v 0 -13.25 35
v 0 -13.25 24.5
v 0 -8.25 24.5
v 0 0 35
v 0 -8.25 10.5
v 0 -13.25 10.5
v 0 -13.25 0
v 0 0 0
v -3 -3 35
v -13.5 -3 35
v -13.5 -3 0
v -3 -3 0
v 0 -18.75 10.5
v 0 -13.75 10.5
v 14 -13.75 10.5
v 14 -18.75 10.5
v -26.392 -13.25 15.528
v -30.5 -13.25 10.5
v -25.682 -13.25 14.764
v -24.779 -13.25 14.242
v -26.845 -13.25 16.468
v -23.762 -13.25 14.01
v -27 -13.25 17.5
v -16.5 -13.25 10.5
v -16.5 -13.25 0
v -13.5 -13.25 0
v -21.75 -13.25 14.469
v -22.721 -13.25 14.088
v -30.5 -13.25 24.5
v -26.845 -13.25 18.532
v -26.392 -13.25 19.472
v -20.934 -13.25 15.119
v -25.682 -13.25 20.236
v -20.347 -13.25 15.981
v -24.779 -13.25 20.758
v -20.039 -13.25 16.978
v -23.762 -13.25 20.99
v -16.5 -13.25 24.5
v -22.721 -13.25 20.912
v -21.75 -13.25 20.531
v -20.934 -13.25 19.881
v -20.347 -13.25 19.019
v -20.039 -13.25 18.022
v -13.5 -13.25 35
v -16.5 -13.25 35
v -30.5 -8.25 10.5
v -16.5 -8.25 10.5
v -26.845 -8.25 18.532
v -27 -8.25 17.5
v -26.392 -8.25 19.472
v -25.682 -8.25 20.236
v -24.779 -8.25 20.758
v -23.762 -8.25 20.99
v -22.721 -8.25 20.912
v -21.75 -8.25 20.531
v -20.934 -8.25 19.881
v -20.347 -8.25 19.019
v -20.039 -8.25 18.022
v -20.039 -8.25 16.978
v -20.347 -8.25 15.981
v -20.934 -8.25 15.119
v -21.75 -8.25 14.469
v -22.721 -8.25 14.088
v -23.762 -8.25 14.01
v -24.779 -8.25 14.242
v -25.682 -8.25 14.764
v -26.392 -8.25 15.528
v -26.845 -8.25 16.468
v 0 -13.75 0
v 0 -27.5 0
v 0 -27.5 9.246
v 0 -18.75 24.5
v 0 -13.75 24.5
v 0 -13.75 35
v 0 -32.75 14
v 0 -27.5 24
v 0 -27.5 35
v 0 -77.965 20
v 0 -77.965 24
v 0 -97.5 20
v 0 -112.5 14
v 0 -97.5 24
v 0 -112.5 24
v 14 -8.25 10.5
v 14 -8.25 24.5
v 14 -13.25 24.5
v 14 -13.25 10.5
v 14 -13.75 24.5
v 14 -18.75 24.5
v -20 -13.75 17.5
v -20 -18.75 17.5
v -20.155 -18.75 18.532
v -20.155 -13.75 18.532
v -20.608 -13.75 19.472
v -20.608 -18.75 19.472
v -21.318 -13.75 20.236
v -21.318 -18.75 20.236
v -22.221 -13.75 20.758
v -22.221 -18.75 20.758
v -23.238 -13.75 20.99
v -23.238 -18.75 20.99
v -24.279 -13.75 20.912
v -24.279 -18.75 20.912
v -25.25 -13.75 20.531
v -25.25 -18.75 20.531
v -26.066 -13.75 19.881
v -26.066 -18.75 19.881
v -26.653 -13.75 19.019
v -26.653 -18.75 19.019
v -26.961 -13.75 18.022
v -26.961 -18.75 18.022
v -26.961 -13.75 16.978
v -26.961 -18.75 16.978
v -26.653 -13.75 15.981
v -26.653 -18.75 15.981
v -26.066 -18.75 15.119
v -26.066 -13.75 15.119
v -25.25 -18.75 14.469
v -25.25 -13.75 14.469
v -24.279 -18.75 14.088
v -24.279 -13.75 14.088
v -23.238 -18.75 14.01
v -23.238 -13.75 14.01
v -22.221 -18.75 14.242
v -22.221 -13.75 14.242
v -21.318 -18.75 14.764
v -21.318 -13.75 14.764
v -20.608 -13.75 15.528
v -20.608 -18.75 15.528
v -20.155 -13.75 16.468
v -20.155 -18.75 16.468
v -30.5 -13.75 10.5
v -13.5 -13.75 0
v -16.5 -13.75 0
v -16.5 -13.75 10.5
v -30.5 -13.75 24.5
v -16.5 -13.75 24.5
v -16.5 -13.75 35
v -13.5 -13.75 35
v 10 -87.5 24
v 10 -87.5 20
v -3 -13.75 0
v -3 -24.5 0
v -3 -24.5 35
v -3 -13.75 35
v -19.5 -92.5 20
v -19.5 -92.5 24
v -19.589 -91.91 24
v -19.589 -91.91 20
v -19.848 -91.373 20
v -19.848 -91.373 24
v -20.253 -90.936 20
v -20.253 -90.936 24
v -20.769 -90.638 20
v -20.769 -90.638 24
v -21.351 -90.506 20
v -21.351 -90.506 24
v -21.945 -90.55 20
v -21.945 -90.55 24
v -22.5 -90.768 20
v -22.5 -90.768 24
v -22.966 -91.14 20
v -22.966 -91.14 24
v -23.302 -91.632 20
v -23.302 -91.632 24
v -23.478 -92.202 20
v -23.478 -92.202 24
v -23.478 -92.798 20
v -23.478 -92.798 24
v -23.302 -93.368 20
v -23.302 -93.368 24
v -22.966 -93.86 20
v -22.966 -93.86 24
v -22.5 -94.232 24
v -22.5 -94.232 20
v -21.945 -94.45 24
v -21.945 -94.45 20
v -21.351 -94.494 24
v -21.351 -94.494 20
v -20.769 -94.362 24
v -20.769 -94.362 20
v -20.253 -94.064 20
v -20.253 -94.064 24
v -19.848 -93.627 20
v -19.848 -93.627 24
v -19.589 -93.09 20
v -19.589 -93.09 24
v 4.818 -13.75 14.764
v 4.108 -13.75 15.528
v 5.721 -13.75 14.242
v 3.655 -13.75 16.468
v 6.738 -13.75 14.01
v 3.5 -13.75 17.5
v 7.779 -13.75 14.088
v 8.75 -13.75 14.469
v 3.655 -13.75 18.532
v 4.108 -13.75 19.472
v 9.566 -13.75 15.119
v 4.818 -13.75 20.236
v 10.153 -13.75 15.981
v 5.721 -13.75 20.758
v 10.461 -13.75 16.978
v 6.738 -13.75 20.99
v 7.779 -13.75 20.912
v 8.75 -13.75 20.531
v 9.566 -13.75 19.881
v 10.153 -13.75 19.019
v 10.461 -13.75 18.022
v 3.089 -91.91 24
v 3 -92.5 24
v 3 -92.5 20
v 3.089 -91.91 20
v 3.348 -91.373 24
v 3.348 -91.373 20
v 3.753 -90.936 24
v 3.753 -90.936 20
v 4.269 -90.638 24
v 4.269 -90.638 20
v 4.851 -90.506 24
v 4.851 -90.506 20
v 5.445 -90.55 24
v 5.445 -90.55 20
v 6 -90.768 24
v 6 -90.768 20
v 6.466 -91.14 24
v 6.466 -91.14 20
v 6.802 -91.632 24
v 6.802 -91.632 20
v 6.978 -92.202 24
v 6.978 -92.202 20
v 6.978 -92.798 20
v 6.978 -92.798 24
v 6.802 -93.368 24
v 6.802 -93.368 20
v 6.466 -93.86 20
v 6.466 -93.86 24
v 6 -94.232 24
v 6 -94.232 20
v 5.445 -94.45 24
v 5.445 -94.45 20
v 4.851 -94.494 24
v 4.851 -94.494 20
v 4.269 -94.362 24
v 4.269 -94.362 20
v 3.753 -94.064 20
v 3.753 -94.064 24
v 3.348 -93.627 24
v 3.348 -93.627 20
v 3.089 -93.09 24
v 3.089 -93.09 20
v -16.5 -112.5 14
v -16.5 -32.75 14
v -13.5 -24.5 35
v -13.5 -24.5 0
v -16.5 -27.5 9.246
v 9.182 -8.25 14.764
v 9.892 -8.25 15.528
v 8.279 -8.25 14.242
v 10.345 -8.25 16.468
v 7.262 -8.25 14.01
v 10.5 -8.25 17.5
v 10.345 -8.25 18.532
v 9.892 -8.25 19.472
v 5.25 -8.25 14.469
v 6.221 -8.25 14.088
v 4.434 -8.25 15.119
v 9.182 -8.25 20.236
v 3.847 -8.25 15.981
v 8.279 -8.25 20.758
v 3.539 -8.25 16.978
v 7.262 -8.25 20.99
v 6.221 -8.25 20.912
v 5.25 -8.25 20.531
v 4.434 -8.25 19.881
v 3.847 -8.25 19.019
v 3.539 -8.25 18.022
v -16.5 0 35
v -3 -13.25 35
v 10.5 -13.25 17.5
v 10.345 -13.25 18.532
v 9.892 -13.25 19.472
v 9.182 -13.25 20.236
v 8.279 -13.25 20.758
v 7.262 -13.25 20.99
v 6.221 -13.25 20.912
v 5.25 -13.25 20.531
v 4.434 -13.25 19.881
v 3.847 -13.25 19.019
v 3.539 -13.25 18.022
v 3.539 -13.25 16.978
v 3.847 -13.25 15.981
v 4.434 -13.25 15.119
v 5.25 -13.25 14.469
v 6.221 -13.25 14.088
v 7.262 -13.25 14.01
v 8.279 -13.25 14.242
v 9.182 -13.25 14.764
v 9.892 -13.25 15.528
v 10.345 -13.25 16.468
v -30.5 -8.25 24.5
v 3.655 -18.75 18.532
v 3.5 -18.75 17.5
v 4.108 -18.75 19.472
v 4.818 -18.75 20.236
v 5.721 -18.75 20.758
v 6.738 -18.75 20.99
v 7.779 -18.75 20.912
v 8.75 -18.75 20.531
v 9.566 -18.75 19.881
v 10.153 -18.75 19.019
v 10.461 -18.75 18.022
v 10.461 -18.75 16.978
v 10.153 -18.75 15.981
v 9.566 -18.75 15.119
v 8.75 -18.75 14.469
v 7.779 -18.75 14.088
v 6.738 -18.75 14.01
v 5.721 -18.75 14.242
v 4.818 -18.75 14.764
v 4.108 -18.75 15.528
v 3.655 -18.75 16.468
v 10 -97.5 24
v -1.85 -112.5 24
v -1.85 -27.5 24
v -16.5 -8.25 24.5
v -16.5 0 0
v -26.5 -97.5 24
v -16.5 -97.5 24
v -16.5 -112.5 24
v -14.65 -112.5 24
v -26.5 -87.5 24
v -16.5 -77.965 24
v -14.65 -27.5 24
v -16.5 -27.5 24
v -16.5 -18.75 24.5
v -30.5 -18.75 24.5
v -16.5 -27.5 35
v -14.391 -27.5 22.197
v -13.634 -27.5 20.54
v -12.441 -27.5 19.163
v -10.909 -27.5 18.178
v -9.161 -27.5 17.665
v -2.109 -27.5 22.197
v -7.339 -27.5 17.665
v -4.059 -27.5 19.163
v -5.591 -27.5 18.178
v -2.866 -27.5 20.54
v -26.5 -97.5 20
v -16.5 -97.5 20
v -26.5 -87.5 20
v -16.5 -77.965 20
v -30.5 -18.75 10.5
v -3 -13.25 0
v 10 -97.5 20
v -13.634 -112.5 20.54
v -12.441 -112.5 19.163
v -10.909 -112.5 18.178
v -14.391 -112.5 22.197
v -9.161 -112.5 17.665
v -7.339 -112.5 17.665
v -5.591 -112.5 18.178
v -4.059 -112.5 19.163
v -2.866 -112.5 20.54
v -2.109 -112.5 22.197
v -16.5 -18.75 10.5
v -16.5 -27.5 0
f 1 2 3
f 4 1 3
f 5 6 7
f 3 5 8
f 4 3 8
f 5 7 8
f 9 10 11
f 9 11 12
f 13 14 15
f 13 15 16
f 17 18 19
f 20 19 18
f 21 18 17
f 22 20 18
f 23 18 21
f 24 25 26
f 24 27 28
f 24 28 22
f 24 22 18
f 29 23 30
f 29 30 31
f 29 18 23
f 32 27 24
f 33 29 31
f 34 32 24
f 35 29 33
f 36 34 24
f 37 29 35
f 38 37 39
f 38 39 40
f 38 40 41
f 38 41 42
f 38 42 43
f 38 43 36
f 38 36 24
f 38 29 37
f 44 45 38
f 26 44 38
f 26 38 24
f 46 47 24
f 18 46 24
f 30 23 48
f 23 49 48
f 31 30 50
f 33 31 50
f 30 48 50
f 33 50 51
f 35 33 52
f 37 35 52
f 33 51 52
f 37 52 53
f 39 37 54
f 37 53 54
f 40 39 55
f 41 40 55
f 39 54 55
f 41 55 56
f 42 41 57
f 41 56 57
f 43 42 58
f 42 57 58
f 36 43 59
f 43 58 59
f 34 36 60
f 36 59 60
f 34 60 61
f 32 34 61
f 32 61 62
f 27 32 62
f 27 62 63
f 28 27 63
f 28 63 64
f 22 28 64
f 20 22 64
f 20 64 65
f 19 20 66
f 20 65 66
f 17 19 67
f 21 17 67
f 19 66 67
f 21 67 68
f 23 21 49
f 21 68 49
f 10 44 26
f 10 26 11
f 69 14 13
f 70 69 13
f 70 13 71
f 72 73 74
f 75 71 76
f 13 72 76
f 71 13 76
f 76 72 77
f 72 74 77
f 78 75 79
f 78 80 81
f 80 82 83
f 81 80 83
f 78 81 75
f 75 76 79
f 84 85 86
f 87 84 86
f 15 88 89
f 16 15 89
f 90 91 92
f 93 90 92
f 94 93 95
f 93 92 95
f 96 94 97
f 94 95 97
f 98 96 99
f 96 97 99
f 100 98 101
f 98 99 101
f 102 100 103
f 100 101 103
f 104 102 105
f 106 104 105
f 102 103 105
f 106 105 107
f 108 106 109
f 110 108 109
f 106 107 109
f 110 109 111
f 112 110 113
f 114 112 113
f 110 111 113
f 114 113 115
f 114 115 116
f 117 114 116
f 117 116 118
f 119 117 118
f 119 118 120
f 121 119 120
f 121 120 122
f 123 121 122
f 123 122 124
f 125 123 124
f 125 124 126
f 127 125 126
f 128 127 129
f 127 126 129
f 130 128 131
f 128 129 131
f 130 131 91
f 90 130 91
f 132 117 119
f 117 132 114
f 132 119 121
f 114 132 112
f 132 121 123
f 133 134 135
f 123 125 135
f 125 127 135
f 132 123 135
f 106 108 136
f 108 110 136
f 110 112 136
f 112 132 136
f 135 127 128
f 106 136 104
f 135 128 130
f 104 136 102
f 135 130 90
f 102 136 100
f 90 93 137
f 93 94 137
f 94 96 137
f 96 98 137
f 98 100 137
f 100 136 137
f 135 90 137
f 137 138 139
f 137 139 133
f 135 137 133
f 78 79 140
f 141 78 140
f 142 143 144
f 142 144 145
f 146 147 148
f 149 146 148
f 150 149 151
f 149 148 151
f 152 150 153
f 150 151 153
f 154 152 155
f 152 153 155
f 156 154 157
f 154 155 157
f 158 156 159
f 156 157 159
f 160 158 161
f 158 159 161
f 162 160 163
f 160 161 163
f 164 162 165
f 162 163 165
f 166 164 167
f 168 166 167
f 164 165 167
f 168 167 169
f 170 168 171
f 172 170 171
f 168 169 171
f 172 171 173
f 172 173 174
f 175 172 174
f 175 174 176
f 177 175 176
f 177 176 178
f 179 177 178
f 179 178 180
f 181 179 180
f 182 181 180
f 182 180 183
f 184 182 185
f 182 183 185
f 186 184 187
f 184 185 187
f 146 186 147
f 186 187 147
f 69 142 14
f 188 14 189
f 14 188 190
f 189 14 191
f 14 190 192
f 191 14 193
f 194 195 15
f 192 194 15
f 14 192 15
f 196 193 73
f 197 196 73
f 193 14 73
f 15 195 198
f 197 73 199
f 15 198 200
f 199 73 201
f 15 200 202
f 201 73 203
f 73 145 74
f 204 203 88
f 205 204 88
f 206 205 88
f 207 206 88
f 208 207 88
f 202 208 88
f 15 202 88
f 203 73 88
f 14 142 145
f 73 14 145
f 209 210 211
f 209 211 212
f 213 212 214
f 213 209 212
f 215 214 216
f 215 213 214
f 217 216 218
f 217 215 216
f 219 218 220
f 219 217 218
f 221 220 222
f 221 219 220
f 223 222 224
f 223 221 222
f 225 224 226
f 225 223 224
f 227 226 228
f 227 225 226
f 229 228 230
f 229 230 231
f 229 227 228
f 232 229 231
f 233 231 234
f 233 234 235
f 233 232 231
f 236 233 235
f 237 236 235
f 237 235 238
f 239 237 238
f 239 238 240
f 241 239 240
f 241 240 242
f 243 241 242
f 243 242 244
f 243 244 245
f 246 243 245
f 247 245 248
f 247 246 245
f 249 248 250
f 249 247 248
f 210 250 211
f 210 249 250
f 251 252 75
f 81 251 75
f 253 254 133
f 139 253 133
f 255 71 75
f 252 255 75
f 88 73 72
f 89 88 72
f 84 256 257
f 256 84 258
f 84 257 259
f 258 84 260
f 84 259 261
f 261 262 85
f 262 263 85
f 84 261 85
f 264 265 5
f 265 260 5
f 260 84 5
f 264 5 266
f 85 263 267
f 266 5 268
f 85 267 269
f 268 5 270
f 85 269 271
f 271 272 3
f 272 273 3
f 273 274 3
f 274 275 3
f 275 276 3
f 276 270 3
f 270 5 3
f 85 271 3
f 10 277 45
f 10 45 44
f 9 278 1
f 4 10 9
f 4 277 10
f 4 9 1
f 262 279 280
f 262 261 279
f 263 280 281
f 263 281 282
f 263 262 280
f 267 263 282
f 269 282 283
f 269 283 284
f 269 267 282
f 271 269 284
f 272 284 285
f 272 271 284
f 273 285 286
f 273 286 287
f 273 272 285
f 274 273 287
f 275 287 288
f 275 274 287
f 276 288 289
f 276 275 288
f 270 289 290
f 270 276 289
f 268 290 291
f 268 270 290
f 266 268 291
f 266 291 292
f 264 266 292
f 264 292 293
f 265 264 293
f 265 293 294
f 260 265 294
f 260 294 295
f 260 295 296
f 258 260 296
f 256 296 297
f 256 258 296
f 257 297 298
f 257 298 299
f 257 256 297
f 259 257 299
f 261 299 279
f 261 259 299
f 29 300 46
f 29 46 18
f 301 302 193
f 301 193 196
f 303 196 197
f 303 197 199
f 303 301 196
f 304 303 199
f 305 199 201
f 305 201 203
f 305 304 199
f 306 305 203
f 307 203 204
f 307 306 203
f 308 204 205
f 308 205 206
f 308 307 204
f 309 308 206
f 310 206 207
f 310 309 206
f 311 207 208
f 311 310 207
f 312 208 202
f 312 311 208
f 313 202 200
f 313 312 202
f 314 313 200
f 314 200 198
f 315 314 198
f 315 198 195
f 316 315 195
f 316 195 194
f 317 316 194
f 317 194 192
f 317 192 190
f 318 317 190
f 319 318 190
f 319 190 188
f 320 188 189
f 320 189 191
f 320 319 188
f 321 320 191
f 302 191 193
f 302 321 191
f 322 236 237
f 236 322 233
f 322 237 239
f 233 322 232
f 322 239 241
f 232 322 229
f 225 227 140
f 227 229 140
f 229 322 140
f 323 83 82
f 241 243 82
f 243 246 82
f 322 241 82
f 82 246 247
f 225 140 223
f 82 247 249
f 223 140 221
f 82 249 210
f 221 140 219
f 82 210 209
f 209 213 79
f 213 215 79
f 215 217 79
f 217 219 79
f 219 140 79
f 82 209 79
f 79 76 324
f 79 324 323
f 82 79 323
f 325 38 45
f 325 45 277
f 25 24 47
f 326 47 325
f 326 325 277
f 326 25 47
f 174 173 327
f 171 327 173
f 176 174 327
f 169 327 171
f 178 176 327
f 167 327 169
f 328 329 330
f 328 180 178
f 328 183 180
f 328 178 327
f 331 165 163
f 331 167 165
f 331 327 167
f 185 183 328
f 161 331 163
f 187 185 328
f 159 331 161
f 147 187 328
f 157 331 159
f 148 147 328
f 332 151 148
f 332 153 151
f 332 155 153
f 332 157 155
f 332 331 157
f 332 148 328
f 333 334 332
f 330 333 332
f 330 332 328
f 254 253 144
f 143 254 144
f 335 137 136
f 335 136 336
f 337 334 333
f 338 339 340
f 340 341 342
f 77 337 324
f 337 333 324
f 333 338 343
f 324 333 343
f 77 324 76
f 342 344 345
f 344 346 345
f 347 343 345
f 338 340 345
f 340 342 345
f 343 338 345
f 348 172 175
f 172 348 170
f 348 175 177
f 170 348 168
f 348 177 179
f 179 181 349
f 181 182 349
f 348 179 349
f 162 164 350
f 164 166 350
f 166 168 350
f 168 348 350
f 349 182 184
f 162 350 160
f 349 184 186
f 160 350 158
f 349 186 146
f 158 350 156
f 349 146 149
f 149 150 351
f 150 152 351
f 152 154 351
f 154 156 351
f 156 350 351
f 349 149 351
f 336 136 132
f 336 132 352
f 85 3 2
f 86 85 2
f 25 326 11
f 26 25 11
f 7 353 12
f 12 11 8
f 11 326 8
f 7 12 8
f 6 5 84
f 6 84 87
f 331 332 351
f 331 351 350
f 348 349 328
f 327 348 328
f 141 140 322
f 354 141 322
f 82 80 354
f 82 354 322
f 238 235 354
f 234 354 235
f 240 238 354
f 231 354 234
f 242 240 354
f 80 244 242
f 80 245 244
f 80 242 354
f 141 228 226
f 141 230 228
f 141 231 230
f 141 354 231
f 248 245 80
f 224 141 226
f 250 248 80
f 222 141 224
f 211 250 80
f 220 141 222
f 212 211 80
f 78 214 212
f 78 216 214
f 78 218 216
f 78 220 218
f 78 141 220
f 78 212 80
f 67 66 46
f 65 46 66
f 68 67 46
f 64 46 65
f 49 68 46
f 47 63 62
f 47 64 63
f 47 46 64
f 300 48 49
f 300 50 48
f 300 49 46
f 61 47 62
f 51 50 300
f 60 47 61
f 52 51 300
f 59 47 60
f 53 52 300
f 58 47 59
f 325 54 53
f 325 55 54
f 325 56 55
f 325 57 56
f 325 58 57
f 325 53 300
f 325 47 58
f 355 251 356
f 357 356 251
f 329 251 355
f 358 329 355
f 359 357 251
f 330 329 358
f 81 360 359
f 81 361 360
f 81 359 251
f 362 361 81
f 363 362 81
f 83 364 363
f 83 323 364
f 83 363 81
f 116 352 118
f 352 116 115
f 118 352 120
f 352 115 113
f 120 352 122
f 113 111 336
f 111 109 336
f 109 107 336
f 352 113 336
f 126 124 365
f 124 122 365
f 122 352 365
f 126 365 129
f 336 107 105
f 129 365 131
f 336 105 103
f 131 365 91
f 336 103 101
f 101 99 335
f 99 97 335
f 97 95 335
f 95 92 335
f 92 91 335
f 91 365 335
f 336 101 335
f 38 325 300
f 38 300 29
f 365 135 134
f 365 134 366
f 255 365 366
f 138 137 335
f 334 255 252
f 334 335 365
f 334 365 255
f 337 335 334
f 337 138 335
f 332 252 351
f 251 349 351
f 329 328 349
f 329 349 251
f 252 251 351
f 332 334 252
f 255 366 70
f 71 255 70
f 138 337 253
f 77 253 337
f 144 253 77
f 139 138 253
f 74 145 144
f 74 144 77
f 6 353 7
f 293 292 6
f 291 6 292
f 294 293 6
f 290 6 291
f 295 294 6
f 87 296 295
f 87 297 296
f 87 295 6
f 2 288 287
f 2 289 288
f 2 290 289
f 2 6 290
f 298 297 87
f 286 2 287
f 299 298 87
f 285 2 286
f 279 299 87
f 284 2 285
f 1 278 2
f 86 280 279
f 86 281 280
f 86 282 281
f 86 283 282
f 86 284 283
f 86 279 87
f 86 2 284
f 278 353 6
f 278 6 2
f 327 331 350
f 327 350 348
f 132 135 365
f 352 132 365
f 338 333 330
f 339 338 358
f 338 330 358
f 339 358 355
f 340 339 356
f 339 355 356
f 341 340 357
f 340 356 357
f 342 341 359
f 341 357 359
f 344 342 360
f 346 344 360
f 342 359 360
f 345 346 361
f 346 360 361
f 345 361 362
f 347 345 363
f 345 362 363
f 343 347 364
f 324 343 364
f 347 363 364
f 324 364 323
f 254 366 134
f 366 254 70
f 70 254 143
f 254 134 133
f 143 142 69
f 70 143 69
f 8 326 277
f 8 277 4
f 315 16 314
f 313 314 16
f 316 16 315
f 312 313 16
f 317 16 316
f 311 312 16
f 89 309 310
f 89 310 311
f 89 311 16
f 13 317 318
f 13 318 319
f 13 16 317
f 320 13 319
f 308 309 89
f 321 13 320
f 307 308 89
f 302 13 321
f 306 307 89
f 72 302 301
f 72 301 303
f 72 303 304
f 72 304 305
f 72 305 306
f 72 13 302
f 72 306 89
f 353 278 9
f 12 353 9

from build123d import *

# Parameters (mm, degrees)
F0_W      = 16.5
F0_H      = 27.5
F1_DEPTH  = 35
F2_W      = 10.5
F2_H      = 21.5
F3_DEPTH  = 35
F4_W      = 3
F4_H      = 0.5
F5_DEPTH  = 35
F6_W      = 5
F6_H      = 14
F7_DEPTH  = 14
F8_R      = 3.5
F9_DEPTH  = 5
F12_W     = 5
F12_H     = 14
F13_DEPTH = 14
F14_R     = 3.5
F15_DEPTH = 255
F17_W     = 16.5
F17_H     = 14
F18_DEPTH = 85
F20_DEPTH = 85
F21_W     = 10
F21_H     = 4
F22_DEPTH = 10
F24_DEPTH = 4
F25_R     = 2
F26_DEPTH = 4
F29_DEPTH = 16.5


with BuildPart() as f1:
    # F0 (on Top) → F1 (new body)
    with BuildSketch(Plane.XY):
        with Locations((-8.25, -13.75)):
            Rectangle(F0_W, F0_H)
    extrude(amount=F1_DEPTH)

    # F2 (on face) → F3 (cut)
    with BuildSketch(Plane.XY.offset(35)):
        with Locations((-8.25, -13.75)):
            Rectangle(F2_W, F2_H)
    extrude(amount=-F3_DEPTH, mode=Mode.SUBTRACT)

    # F4 (on face) → F5 (cut)
    with BuildSketch(Plane.XY.offset(35)):
        with Locations((-1.5, -13.5)):
            Rectangle(F4_W, F4_H)
        with Locations((-15, -13.5)):
            Rectangle(F4_W, F4_H)
    extrude(amount=-F5_DEPTH, mode=Mode.SUBTRACT)

    # F6 (on face) → F7 (join)
    with BuildSketch(Plane(origin=(-16.5, 0, 0), x_dir=(0, -1, 0), z_dir=(-1, 0, 0))):
        with Locations((16.25, 17.5)):
            Rectangle(F6_W, F6_H)
    extrude(amount=F7_DEPTH)

    # F8 (on face) → F9 (cut)
    with BuildSketch(Plane.XZ.offset(18.75)):
        with Locations((-23.5, 17.5)):
            Circle(F8_R)
    extrude(amount=-F9_DEPTH, mode=Mode.SUBTRACT)

    # F11: F1 across plane


with BuildPart() as f1_1:
    add(f1.part)
    add(f1.part.mirror(Plane(origin=(-8.25, -6.625, 17.5), x_dir=(0, -1, 0), z_dir=(-1, 0, 0))))

    # F12 (on face) → F13 (join)
    with BuildSketch(Plane(origin=(-16.5, 0, 0), x_dir=(0, -1, 0), z_dir=(-1, 0, 0))):
        with Locations((10.75, 17.5)):
            Rectangle(F12_W, F12_H)
    extrude(amount=F13_DEPTH)

    # F14 (on face) → F15 (cut)
    with BuildSketch(Plane(origin=(0, -8.25, 0), x_dir=(-1, 0, 0), z_dir=(0, 1, 0))):
        with Locations((23.5, 17.5)):
            Circle(F14_R)
    extrude(amount=-F15_DEPTH, mode=Mode.SUBTRACT)

    # F16: F1 across plane


with BuildPart() as f1_2:
    add(f1_1.part)
    add(f1_1.part.mirror(Plane(origin=(-8.25, -6.625, 17.5), x_dir=(0, -1, 0), z_dir=(-1, 0, 0))))

    # F17 (on face) → F18 (join)
    with BuildSketch(Plane.XZ.offset(27.5)):
        with Locations((-8.25, 21)):
            Rectangle(F17_W, F17_H)
    extrude(amount=F18_DEPTH)

    # F19 (on face) → F20 (cut)
    with BuildSketch(Plane.XZ.offset(112.5)):
        with BuildLine():
            Line((-16.5, 24), (-14.65, 24))
            ThreePointArc((-14.65, 24), (-8.25, 17.6), (-1.85, 24))
            Line((-1.85, 24), (0, 24))
            Line((0, 24), (0, 28))
            Line((0, 28), (-16.5, 28))
            Line((-16.5, 28), (-16.5, 24))
        make_face()
    extrude(amount=-F20_DEPTH, mode=Mode.SUBTRACT)

    # F21 (on face) → F22 (join)
    with BuildSketch(Plane(origin=(-16.5, 0, 0), x_dir=(0, -1, 0), z_dir=(-1, 0, 0))):
        with Locations((92.5, 22)):
            Rectangle(F21_W, F21_H)
    extrude(amount=F22_DEPTH)

    # F23 (on face) → F24 (join)
    with BuildSketch(Plane.XY.offset(24)):
        Polygon((-16.5, -77.965461), (-26.5, -87.5), (-16.5, -87.5), align=None)
    extrude(amount=-F24_DEPTH)

    # F25 (on face) → F26 (cut)
    with BuildSketch(Plane.XY.offset(24)):
        with Locations((-21.5, -92.5)):
            Circle(F25_R)
    extrude(amount=-F26_DEPTH, mode=Mode.SUBTRACT)

    # F27: F1 across plane


with BuildPart() as f1_3:
    add(f1_2.part)
    add(f1_2.part.mirror(Plane(origin=(-8.25, -6.625, 17.5), x_dir=(0, -1, 0), z_dir=(-1, 0, 0))))

    # F28 (on face) → F29 (join)
    with BuildSketch(Plane(origin=(-16.5, 0, 0), x_dir=(0, -1, 0), z_dir=(-1, 0, 0))):
        Polygon((27.5, 14), (27.5, 9.245562), (32.74994, 14), align=None)
    extrude(amount=-F29_DEPTH)


solid = f1_3.part
